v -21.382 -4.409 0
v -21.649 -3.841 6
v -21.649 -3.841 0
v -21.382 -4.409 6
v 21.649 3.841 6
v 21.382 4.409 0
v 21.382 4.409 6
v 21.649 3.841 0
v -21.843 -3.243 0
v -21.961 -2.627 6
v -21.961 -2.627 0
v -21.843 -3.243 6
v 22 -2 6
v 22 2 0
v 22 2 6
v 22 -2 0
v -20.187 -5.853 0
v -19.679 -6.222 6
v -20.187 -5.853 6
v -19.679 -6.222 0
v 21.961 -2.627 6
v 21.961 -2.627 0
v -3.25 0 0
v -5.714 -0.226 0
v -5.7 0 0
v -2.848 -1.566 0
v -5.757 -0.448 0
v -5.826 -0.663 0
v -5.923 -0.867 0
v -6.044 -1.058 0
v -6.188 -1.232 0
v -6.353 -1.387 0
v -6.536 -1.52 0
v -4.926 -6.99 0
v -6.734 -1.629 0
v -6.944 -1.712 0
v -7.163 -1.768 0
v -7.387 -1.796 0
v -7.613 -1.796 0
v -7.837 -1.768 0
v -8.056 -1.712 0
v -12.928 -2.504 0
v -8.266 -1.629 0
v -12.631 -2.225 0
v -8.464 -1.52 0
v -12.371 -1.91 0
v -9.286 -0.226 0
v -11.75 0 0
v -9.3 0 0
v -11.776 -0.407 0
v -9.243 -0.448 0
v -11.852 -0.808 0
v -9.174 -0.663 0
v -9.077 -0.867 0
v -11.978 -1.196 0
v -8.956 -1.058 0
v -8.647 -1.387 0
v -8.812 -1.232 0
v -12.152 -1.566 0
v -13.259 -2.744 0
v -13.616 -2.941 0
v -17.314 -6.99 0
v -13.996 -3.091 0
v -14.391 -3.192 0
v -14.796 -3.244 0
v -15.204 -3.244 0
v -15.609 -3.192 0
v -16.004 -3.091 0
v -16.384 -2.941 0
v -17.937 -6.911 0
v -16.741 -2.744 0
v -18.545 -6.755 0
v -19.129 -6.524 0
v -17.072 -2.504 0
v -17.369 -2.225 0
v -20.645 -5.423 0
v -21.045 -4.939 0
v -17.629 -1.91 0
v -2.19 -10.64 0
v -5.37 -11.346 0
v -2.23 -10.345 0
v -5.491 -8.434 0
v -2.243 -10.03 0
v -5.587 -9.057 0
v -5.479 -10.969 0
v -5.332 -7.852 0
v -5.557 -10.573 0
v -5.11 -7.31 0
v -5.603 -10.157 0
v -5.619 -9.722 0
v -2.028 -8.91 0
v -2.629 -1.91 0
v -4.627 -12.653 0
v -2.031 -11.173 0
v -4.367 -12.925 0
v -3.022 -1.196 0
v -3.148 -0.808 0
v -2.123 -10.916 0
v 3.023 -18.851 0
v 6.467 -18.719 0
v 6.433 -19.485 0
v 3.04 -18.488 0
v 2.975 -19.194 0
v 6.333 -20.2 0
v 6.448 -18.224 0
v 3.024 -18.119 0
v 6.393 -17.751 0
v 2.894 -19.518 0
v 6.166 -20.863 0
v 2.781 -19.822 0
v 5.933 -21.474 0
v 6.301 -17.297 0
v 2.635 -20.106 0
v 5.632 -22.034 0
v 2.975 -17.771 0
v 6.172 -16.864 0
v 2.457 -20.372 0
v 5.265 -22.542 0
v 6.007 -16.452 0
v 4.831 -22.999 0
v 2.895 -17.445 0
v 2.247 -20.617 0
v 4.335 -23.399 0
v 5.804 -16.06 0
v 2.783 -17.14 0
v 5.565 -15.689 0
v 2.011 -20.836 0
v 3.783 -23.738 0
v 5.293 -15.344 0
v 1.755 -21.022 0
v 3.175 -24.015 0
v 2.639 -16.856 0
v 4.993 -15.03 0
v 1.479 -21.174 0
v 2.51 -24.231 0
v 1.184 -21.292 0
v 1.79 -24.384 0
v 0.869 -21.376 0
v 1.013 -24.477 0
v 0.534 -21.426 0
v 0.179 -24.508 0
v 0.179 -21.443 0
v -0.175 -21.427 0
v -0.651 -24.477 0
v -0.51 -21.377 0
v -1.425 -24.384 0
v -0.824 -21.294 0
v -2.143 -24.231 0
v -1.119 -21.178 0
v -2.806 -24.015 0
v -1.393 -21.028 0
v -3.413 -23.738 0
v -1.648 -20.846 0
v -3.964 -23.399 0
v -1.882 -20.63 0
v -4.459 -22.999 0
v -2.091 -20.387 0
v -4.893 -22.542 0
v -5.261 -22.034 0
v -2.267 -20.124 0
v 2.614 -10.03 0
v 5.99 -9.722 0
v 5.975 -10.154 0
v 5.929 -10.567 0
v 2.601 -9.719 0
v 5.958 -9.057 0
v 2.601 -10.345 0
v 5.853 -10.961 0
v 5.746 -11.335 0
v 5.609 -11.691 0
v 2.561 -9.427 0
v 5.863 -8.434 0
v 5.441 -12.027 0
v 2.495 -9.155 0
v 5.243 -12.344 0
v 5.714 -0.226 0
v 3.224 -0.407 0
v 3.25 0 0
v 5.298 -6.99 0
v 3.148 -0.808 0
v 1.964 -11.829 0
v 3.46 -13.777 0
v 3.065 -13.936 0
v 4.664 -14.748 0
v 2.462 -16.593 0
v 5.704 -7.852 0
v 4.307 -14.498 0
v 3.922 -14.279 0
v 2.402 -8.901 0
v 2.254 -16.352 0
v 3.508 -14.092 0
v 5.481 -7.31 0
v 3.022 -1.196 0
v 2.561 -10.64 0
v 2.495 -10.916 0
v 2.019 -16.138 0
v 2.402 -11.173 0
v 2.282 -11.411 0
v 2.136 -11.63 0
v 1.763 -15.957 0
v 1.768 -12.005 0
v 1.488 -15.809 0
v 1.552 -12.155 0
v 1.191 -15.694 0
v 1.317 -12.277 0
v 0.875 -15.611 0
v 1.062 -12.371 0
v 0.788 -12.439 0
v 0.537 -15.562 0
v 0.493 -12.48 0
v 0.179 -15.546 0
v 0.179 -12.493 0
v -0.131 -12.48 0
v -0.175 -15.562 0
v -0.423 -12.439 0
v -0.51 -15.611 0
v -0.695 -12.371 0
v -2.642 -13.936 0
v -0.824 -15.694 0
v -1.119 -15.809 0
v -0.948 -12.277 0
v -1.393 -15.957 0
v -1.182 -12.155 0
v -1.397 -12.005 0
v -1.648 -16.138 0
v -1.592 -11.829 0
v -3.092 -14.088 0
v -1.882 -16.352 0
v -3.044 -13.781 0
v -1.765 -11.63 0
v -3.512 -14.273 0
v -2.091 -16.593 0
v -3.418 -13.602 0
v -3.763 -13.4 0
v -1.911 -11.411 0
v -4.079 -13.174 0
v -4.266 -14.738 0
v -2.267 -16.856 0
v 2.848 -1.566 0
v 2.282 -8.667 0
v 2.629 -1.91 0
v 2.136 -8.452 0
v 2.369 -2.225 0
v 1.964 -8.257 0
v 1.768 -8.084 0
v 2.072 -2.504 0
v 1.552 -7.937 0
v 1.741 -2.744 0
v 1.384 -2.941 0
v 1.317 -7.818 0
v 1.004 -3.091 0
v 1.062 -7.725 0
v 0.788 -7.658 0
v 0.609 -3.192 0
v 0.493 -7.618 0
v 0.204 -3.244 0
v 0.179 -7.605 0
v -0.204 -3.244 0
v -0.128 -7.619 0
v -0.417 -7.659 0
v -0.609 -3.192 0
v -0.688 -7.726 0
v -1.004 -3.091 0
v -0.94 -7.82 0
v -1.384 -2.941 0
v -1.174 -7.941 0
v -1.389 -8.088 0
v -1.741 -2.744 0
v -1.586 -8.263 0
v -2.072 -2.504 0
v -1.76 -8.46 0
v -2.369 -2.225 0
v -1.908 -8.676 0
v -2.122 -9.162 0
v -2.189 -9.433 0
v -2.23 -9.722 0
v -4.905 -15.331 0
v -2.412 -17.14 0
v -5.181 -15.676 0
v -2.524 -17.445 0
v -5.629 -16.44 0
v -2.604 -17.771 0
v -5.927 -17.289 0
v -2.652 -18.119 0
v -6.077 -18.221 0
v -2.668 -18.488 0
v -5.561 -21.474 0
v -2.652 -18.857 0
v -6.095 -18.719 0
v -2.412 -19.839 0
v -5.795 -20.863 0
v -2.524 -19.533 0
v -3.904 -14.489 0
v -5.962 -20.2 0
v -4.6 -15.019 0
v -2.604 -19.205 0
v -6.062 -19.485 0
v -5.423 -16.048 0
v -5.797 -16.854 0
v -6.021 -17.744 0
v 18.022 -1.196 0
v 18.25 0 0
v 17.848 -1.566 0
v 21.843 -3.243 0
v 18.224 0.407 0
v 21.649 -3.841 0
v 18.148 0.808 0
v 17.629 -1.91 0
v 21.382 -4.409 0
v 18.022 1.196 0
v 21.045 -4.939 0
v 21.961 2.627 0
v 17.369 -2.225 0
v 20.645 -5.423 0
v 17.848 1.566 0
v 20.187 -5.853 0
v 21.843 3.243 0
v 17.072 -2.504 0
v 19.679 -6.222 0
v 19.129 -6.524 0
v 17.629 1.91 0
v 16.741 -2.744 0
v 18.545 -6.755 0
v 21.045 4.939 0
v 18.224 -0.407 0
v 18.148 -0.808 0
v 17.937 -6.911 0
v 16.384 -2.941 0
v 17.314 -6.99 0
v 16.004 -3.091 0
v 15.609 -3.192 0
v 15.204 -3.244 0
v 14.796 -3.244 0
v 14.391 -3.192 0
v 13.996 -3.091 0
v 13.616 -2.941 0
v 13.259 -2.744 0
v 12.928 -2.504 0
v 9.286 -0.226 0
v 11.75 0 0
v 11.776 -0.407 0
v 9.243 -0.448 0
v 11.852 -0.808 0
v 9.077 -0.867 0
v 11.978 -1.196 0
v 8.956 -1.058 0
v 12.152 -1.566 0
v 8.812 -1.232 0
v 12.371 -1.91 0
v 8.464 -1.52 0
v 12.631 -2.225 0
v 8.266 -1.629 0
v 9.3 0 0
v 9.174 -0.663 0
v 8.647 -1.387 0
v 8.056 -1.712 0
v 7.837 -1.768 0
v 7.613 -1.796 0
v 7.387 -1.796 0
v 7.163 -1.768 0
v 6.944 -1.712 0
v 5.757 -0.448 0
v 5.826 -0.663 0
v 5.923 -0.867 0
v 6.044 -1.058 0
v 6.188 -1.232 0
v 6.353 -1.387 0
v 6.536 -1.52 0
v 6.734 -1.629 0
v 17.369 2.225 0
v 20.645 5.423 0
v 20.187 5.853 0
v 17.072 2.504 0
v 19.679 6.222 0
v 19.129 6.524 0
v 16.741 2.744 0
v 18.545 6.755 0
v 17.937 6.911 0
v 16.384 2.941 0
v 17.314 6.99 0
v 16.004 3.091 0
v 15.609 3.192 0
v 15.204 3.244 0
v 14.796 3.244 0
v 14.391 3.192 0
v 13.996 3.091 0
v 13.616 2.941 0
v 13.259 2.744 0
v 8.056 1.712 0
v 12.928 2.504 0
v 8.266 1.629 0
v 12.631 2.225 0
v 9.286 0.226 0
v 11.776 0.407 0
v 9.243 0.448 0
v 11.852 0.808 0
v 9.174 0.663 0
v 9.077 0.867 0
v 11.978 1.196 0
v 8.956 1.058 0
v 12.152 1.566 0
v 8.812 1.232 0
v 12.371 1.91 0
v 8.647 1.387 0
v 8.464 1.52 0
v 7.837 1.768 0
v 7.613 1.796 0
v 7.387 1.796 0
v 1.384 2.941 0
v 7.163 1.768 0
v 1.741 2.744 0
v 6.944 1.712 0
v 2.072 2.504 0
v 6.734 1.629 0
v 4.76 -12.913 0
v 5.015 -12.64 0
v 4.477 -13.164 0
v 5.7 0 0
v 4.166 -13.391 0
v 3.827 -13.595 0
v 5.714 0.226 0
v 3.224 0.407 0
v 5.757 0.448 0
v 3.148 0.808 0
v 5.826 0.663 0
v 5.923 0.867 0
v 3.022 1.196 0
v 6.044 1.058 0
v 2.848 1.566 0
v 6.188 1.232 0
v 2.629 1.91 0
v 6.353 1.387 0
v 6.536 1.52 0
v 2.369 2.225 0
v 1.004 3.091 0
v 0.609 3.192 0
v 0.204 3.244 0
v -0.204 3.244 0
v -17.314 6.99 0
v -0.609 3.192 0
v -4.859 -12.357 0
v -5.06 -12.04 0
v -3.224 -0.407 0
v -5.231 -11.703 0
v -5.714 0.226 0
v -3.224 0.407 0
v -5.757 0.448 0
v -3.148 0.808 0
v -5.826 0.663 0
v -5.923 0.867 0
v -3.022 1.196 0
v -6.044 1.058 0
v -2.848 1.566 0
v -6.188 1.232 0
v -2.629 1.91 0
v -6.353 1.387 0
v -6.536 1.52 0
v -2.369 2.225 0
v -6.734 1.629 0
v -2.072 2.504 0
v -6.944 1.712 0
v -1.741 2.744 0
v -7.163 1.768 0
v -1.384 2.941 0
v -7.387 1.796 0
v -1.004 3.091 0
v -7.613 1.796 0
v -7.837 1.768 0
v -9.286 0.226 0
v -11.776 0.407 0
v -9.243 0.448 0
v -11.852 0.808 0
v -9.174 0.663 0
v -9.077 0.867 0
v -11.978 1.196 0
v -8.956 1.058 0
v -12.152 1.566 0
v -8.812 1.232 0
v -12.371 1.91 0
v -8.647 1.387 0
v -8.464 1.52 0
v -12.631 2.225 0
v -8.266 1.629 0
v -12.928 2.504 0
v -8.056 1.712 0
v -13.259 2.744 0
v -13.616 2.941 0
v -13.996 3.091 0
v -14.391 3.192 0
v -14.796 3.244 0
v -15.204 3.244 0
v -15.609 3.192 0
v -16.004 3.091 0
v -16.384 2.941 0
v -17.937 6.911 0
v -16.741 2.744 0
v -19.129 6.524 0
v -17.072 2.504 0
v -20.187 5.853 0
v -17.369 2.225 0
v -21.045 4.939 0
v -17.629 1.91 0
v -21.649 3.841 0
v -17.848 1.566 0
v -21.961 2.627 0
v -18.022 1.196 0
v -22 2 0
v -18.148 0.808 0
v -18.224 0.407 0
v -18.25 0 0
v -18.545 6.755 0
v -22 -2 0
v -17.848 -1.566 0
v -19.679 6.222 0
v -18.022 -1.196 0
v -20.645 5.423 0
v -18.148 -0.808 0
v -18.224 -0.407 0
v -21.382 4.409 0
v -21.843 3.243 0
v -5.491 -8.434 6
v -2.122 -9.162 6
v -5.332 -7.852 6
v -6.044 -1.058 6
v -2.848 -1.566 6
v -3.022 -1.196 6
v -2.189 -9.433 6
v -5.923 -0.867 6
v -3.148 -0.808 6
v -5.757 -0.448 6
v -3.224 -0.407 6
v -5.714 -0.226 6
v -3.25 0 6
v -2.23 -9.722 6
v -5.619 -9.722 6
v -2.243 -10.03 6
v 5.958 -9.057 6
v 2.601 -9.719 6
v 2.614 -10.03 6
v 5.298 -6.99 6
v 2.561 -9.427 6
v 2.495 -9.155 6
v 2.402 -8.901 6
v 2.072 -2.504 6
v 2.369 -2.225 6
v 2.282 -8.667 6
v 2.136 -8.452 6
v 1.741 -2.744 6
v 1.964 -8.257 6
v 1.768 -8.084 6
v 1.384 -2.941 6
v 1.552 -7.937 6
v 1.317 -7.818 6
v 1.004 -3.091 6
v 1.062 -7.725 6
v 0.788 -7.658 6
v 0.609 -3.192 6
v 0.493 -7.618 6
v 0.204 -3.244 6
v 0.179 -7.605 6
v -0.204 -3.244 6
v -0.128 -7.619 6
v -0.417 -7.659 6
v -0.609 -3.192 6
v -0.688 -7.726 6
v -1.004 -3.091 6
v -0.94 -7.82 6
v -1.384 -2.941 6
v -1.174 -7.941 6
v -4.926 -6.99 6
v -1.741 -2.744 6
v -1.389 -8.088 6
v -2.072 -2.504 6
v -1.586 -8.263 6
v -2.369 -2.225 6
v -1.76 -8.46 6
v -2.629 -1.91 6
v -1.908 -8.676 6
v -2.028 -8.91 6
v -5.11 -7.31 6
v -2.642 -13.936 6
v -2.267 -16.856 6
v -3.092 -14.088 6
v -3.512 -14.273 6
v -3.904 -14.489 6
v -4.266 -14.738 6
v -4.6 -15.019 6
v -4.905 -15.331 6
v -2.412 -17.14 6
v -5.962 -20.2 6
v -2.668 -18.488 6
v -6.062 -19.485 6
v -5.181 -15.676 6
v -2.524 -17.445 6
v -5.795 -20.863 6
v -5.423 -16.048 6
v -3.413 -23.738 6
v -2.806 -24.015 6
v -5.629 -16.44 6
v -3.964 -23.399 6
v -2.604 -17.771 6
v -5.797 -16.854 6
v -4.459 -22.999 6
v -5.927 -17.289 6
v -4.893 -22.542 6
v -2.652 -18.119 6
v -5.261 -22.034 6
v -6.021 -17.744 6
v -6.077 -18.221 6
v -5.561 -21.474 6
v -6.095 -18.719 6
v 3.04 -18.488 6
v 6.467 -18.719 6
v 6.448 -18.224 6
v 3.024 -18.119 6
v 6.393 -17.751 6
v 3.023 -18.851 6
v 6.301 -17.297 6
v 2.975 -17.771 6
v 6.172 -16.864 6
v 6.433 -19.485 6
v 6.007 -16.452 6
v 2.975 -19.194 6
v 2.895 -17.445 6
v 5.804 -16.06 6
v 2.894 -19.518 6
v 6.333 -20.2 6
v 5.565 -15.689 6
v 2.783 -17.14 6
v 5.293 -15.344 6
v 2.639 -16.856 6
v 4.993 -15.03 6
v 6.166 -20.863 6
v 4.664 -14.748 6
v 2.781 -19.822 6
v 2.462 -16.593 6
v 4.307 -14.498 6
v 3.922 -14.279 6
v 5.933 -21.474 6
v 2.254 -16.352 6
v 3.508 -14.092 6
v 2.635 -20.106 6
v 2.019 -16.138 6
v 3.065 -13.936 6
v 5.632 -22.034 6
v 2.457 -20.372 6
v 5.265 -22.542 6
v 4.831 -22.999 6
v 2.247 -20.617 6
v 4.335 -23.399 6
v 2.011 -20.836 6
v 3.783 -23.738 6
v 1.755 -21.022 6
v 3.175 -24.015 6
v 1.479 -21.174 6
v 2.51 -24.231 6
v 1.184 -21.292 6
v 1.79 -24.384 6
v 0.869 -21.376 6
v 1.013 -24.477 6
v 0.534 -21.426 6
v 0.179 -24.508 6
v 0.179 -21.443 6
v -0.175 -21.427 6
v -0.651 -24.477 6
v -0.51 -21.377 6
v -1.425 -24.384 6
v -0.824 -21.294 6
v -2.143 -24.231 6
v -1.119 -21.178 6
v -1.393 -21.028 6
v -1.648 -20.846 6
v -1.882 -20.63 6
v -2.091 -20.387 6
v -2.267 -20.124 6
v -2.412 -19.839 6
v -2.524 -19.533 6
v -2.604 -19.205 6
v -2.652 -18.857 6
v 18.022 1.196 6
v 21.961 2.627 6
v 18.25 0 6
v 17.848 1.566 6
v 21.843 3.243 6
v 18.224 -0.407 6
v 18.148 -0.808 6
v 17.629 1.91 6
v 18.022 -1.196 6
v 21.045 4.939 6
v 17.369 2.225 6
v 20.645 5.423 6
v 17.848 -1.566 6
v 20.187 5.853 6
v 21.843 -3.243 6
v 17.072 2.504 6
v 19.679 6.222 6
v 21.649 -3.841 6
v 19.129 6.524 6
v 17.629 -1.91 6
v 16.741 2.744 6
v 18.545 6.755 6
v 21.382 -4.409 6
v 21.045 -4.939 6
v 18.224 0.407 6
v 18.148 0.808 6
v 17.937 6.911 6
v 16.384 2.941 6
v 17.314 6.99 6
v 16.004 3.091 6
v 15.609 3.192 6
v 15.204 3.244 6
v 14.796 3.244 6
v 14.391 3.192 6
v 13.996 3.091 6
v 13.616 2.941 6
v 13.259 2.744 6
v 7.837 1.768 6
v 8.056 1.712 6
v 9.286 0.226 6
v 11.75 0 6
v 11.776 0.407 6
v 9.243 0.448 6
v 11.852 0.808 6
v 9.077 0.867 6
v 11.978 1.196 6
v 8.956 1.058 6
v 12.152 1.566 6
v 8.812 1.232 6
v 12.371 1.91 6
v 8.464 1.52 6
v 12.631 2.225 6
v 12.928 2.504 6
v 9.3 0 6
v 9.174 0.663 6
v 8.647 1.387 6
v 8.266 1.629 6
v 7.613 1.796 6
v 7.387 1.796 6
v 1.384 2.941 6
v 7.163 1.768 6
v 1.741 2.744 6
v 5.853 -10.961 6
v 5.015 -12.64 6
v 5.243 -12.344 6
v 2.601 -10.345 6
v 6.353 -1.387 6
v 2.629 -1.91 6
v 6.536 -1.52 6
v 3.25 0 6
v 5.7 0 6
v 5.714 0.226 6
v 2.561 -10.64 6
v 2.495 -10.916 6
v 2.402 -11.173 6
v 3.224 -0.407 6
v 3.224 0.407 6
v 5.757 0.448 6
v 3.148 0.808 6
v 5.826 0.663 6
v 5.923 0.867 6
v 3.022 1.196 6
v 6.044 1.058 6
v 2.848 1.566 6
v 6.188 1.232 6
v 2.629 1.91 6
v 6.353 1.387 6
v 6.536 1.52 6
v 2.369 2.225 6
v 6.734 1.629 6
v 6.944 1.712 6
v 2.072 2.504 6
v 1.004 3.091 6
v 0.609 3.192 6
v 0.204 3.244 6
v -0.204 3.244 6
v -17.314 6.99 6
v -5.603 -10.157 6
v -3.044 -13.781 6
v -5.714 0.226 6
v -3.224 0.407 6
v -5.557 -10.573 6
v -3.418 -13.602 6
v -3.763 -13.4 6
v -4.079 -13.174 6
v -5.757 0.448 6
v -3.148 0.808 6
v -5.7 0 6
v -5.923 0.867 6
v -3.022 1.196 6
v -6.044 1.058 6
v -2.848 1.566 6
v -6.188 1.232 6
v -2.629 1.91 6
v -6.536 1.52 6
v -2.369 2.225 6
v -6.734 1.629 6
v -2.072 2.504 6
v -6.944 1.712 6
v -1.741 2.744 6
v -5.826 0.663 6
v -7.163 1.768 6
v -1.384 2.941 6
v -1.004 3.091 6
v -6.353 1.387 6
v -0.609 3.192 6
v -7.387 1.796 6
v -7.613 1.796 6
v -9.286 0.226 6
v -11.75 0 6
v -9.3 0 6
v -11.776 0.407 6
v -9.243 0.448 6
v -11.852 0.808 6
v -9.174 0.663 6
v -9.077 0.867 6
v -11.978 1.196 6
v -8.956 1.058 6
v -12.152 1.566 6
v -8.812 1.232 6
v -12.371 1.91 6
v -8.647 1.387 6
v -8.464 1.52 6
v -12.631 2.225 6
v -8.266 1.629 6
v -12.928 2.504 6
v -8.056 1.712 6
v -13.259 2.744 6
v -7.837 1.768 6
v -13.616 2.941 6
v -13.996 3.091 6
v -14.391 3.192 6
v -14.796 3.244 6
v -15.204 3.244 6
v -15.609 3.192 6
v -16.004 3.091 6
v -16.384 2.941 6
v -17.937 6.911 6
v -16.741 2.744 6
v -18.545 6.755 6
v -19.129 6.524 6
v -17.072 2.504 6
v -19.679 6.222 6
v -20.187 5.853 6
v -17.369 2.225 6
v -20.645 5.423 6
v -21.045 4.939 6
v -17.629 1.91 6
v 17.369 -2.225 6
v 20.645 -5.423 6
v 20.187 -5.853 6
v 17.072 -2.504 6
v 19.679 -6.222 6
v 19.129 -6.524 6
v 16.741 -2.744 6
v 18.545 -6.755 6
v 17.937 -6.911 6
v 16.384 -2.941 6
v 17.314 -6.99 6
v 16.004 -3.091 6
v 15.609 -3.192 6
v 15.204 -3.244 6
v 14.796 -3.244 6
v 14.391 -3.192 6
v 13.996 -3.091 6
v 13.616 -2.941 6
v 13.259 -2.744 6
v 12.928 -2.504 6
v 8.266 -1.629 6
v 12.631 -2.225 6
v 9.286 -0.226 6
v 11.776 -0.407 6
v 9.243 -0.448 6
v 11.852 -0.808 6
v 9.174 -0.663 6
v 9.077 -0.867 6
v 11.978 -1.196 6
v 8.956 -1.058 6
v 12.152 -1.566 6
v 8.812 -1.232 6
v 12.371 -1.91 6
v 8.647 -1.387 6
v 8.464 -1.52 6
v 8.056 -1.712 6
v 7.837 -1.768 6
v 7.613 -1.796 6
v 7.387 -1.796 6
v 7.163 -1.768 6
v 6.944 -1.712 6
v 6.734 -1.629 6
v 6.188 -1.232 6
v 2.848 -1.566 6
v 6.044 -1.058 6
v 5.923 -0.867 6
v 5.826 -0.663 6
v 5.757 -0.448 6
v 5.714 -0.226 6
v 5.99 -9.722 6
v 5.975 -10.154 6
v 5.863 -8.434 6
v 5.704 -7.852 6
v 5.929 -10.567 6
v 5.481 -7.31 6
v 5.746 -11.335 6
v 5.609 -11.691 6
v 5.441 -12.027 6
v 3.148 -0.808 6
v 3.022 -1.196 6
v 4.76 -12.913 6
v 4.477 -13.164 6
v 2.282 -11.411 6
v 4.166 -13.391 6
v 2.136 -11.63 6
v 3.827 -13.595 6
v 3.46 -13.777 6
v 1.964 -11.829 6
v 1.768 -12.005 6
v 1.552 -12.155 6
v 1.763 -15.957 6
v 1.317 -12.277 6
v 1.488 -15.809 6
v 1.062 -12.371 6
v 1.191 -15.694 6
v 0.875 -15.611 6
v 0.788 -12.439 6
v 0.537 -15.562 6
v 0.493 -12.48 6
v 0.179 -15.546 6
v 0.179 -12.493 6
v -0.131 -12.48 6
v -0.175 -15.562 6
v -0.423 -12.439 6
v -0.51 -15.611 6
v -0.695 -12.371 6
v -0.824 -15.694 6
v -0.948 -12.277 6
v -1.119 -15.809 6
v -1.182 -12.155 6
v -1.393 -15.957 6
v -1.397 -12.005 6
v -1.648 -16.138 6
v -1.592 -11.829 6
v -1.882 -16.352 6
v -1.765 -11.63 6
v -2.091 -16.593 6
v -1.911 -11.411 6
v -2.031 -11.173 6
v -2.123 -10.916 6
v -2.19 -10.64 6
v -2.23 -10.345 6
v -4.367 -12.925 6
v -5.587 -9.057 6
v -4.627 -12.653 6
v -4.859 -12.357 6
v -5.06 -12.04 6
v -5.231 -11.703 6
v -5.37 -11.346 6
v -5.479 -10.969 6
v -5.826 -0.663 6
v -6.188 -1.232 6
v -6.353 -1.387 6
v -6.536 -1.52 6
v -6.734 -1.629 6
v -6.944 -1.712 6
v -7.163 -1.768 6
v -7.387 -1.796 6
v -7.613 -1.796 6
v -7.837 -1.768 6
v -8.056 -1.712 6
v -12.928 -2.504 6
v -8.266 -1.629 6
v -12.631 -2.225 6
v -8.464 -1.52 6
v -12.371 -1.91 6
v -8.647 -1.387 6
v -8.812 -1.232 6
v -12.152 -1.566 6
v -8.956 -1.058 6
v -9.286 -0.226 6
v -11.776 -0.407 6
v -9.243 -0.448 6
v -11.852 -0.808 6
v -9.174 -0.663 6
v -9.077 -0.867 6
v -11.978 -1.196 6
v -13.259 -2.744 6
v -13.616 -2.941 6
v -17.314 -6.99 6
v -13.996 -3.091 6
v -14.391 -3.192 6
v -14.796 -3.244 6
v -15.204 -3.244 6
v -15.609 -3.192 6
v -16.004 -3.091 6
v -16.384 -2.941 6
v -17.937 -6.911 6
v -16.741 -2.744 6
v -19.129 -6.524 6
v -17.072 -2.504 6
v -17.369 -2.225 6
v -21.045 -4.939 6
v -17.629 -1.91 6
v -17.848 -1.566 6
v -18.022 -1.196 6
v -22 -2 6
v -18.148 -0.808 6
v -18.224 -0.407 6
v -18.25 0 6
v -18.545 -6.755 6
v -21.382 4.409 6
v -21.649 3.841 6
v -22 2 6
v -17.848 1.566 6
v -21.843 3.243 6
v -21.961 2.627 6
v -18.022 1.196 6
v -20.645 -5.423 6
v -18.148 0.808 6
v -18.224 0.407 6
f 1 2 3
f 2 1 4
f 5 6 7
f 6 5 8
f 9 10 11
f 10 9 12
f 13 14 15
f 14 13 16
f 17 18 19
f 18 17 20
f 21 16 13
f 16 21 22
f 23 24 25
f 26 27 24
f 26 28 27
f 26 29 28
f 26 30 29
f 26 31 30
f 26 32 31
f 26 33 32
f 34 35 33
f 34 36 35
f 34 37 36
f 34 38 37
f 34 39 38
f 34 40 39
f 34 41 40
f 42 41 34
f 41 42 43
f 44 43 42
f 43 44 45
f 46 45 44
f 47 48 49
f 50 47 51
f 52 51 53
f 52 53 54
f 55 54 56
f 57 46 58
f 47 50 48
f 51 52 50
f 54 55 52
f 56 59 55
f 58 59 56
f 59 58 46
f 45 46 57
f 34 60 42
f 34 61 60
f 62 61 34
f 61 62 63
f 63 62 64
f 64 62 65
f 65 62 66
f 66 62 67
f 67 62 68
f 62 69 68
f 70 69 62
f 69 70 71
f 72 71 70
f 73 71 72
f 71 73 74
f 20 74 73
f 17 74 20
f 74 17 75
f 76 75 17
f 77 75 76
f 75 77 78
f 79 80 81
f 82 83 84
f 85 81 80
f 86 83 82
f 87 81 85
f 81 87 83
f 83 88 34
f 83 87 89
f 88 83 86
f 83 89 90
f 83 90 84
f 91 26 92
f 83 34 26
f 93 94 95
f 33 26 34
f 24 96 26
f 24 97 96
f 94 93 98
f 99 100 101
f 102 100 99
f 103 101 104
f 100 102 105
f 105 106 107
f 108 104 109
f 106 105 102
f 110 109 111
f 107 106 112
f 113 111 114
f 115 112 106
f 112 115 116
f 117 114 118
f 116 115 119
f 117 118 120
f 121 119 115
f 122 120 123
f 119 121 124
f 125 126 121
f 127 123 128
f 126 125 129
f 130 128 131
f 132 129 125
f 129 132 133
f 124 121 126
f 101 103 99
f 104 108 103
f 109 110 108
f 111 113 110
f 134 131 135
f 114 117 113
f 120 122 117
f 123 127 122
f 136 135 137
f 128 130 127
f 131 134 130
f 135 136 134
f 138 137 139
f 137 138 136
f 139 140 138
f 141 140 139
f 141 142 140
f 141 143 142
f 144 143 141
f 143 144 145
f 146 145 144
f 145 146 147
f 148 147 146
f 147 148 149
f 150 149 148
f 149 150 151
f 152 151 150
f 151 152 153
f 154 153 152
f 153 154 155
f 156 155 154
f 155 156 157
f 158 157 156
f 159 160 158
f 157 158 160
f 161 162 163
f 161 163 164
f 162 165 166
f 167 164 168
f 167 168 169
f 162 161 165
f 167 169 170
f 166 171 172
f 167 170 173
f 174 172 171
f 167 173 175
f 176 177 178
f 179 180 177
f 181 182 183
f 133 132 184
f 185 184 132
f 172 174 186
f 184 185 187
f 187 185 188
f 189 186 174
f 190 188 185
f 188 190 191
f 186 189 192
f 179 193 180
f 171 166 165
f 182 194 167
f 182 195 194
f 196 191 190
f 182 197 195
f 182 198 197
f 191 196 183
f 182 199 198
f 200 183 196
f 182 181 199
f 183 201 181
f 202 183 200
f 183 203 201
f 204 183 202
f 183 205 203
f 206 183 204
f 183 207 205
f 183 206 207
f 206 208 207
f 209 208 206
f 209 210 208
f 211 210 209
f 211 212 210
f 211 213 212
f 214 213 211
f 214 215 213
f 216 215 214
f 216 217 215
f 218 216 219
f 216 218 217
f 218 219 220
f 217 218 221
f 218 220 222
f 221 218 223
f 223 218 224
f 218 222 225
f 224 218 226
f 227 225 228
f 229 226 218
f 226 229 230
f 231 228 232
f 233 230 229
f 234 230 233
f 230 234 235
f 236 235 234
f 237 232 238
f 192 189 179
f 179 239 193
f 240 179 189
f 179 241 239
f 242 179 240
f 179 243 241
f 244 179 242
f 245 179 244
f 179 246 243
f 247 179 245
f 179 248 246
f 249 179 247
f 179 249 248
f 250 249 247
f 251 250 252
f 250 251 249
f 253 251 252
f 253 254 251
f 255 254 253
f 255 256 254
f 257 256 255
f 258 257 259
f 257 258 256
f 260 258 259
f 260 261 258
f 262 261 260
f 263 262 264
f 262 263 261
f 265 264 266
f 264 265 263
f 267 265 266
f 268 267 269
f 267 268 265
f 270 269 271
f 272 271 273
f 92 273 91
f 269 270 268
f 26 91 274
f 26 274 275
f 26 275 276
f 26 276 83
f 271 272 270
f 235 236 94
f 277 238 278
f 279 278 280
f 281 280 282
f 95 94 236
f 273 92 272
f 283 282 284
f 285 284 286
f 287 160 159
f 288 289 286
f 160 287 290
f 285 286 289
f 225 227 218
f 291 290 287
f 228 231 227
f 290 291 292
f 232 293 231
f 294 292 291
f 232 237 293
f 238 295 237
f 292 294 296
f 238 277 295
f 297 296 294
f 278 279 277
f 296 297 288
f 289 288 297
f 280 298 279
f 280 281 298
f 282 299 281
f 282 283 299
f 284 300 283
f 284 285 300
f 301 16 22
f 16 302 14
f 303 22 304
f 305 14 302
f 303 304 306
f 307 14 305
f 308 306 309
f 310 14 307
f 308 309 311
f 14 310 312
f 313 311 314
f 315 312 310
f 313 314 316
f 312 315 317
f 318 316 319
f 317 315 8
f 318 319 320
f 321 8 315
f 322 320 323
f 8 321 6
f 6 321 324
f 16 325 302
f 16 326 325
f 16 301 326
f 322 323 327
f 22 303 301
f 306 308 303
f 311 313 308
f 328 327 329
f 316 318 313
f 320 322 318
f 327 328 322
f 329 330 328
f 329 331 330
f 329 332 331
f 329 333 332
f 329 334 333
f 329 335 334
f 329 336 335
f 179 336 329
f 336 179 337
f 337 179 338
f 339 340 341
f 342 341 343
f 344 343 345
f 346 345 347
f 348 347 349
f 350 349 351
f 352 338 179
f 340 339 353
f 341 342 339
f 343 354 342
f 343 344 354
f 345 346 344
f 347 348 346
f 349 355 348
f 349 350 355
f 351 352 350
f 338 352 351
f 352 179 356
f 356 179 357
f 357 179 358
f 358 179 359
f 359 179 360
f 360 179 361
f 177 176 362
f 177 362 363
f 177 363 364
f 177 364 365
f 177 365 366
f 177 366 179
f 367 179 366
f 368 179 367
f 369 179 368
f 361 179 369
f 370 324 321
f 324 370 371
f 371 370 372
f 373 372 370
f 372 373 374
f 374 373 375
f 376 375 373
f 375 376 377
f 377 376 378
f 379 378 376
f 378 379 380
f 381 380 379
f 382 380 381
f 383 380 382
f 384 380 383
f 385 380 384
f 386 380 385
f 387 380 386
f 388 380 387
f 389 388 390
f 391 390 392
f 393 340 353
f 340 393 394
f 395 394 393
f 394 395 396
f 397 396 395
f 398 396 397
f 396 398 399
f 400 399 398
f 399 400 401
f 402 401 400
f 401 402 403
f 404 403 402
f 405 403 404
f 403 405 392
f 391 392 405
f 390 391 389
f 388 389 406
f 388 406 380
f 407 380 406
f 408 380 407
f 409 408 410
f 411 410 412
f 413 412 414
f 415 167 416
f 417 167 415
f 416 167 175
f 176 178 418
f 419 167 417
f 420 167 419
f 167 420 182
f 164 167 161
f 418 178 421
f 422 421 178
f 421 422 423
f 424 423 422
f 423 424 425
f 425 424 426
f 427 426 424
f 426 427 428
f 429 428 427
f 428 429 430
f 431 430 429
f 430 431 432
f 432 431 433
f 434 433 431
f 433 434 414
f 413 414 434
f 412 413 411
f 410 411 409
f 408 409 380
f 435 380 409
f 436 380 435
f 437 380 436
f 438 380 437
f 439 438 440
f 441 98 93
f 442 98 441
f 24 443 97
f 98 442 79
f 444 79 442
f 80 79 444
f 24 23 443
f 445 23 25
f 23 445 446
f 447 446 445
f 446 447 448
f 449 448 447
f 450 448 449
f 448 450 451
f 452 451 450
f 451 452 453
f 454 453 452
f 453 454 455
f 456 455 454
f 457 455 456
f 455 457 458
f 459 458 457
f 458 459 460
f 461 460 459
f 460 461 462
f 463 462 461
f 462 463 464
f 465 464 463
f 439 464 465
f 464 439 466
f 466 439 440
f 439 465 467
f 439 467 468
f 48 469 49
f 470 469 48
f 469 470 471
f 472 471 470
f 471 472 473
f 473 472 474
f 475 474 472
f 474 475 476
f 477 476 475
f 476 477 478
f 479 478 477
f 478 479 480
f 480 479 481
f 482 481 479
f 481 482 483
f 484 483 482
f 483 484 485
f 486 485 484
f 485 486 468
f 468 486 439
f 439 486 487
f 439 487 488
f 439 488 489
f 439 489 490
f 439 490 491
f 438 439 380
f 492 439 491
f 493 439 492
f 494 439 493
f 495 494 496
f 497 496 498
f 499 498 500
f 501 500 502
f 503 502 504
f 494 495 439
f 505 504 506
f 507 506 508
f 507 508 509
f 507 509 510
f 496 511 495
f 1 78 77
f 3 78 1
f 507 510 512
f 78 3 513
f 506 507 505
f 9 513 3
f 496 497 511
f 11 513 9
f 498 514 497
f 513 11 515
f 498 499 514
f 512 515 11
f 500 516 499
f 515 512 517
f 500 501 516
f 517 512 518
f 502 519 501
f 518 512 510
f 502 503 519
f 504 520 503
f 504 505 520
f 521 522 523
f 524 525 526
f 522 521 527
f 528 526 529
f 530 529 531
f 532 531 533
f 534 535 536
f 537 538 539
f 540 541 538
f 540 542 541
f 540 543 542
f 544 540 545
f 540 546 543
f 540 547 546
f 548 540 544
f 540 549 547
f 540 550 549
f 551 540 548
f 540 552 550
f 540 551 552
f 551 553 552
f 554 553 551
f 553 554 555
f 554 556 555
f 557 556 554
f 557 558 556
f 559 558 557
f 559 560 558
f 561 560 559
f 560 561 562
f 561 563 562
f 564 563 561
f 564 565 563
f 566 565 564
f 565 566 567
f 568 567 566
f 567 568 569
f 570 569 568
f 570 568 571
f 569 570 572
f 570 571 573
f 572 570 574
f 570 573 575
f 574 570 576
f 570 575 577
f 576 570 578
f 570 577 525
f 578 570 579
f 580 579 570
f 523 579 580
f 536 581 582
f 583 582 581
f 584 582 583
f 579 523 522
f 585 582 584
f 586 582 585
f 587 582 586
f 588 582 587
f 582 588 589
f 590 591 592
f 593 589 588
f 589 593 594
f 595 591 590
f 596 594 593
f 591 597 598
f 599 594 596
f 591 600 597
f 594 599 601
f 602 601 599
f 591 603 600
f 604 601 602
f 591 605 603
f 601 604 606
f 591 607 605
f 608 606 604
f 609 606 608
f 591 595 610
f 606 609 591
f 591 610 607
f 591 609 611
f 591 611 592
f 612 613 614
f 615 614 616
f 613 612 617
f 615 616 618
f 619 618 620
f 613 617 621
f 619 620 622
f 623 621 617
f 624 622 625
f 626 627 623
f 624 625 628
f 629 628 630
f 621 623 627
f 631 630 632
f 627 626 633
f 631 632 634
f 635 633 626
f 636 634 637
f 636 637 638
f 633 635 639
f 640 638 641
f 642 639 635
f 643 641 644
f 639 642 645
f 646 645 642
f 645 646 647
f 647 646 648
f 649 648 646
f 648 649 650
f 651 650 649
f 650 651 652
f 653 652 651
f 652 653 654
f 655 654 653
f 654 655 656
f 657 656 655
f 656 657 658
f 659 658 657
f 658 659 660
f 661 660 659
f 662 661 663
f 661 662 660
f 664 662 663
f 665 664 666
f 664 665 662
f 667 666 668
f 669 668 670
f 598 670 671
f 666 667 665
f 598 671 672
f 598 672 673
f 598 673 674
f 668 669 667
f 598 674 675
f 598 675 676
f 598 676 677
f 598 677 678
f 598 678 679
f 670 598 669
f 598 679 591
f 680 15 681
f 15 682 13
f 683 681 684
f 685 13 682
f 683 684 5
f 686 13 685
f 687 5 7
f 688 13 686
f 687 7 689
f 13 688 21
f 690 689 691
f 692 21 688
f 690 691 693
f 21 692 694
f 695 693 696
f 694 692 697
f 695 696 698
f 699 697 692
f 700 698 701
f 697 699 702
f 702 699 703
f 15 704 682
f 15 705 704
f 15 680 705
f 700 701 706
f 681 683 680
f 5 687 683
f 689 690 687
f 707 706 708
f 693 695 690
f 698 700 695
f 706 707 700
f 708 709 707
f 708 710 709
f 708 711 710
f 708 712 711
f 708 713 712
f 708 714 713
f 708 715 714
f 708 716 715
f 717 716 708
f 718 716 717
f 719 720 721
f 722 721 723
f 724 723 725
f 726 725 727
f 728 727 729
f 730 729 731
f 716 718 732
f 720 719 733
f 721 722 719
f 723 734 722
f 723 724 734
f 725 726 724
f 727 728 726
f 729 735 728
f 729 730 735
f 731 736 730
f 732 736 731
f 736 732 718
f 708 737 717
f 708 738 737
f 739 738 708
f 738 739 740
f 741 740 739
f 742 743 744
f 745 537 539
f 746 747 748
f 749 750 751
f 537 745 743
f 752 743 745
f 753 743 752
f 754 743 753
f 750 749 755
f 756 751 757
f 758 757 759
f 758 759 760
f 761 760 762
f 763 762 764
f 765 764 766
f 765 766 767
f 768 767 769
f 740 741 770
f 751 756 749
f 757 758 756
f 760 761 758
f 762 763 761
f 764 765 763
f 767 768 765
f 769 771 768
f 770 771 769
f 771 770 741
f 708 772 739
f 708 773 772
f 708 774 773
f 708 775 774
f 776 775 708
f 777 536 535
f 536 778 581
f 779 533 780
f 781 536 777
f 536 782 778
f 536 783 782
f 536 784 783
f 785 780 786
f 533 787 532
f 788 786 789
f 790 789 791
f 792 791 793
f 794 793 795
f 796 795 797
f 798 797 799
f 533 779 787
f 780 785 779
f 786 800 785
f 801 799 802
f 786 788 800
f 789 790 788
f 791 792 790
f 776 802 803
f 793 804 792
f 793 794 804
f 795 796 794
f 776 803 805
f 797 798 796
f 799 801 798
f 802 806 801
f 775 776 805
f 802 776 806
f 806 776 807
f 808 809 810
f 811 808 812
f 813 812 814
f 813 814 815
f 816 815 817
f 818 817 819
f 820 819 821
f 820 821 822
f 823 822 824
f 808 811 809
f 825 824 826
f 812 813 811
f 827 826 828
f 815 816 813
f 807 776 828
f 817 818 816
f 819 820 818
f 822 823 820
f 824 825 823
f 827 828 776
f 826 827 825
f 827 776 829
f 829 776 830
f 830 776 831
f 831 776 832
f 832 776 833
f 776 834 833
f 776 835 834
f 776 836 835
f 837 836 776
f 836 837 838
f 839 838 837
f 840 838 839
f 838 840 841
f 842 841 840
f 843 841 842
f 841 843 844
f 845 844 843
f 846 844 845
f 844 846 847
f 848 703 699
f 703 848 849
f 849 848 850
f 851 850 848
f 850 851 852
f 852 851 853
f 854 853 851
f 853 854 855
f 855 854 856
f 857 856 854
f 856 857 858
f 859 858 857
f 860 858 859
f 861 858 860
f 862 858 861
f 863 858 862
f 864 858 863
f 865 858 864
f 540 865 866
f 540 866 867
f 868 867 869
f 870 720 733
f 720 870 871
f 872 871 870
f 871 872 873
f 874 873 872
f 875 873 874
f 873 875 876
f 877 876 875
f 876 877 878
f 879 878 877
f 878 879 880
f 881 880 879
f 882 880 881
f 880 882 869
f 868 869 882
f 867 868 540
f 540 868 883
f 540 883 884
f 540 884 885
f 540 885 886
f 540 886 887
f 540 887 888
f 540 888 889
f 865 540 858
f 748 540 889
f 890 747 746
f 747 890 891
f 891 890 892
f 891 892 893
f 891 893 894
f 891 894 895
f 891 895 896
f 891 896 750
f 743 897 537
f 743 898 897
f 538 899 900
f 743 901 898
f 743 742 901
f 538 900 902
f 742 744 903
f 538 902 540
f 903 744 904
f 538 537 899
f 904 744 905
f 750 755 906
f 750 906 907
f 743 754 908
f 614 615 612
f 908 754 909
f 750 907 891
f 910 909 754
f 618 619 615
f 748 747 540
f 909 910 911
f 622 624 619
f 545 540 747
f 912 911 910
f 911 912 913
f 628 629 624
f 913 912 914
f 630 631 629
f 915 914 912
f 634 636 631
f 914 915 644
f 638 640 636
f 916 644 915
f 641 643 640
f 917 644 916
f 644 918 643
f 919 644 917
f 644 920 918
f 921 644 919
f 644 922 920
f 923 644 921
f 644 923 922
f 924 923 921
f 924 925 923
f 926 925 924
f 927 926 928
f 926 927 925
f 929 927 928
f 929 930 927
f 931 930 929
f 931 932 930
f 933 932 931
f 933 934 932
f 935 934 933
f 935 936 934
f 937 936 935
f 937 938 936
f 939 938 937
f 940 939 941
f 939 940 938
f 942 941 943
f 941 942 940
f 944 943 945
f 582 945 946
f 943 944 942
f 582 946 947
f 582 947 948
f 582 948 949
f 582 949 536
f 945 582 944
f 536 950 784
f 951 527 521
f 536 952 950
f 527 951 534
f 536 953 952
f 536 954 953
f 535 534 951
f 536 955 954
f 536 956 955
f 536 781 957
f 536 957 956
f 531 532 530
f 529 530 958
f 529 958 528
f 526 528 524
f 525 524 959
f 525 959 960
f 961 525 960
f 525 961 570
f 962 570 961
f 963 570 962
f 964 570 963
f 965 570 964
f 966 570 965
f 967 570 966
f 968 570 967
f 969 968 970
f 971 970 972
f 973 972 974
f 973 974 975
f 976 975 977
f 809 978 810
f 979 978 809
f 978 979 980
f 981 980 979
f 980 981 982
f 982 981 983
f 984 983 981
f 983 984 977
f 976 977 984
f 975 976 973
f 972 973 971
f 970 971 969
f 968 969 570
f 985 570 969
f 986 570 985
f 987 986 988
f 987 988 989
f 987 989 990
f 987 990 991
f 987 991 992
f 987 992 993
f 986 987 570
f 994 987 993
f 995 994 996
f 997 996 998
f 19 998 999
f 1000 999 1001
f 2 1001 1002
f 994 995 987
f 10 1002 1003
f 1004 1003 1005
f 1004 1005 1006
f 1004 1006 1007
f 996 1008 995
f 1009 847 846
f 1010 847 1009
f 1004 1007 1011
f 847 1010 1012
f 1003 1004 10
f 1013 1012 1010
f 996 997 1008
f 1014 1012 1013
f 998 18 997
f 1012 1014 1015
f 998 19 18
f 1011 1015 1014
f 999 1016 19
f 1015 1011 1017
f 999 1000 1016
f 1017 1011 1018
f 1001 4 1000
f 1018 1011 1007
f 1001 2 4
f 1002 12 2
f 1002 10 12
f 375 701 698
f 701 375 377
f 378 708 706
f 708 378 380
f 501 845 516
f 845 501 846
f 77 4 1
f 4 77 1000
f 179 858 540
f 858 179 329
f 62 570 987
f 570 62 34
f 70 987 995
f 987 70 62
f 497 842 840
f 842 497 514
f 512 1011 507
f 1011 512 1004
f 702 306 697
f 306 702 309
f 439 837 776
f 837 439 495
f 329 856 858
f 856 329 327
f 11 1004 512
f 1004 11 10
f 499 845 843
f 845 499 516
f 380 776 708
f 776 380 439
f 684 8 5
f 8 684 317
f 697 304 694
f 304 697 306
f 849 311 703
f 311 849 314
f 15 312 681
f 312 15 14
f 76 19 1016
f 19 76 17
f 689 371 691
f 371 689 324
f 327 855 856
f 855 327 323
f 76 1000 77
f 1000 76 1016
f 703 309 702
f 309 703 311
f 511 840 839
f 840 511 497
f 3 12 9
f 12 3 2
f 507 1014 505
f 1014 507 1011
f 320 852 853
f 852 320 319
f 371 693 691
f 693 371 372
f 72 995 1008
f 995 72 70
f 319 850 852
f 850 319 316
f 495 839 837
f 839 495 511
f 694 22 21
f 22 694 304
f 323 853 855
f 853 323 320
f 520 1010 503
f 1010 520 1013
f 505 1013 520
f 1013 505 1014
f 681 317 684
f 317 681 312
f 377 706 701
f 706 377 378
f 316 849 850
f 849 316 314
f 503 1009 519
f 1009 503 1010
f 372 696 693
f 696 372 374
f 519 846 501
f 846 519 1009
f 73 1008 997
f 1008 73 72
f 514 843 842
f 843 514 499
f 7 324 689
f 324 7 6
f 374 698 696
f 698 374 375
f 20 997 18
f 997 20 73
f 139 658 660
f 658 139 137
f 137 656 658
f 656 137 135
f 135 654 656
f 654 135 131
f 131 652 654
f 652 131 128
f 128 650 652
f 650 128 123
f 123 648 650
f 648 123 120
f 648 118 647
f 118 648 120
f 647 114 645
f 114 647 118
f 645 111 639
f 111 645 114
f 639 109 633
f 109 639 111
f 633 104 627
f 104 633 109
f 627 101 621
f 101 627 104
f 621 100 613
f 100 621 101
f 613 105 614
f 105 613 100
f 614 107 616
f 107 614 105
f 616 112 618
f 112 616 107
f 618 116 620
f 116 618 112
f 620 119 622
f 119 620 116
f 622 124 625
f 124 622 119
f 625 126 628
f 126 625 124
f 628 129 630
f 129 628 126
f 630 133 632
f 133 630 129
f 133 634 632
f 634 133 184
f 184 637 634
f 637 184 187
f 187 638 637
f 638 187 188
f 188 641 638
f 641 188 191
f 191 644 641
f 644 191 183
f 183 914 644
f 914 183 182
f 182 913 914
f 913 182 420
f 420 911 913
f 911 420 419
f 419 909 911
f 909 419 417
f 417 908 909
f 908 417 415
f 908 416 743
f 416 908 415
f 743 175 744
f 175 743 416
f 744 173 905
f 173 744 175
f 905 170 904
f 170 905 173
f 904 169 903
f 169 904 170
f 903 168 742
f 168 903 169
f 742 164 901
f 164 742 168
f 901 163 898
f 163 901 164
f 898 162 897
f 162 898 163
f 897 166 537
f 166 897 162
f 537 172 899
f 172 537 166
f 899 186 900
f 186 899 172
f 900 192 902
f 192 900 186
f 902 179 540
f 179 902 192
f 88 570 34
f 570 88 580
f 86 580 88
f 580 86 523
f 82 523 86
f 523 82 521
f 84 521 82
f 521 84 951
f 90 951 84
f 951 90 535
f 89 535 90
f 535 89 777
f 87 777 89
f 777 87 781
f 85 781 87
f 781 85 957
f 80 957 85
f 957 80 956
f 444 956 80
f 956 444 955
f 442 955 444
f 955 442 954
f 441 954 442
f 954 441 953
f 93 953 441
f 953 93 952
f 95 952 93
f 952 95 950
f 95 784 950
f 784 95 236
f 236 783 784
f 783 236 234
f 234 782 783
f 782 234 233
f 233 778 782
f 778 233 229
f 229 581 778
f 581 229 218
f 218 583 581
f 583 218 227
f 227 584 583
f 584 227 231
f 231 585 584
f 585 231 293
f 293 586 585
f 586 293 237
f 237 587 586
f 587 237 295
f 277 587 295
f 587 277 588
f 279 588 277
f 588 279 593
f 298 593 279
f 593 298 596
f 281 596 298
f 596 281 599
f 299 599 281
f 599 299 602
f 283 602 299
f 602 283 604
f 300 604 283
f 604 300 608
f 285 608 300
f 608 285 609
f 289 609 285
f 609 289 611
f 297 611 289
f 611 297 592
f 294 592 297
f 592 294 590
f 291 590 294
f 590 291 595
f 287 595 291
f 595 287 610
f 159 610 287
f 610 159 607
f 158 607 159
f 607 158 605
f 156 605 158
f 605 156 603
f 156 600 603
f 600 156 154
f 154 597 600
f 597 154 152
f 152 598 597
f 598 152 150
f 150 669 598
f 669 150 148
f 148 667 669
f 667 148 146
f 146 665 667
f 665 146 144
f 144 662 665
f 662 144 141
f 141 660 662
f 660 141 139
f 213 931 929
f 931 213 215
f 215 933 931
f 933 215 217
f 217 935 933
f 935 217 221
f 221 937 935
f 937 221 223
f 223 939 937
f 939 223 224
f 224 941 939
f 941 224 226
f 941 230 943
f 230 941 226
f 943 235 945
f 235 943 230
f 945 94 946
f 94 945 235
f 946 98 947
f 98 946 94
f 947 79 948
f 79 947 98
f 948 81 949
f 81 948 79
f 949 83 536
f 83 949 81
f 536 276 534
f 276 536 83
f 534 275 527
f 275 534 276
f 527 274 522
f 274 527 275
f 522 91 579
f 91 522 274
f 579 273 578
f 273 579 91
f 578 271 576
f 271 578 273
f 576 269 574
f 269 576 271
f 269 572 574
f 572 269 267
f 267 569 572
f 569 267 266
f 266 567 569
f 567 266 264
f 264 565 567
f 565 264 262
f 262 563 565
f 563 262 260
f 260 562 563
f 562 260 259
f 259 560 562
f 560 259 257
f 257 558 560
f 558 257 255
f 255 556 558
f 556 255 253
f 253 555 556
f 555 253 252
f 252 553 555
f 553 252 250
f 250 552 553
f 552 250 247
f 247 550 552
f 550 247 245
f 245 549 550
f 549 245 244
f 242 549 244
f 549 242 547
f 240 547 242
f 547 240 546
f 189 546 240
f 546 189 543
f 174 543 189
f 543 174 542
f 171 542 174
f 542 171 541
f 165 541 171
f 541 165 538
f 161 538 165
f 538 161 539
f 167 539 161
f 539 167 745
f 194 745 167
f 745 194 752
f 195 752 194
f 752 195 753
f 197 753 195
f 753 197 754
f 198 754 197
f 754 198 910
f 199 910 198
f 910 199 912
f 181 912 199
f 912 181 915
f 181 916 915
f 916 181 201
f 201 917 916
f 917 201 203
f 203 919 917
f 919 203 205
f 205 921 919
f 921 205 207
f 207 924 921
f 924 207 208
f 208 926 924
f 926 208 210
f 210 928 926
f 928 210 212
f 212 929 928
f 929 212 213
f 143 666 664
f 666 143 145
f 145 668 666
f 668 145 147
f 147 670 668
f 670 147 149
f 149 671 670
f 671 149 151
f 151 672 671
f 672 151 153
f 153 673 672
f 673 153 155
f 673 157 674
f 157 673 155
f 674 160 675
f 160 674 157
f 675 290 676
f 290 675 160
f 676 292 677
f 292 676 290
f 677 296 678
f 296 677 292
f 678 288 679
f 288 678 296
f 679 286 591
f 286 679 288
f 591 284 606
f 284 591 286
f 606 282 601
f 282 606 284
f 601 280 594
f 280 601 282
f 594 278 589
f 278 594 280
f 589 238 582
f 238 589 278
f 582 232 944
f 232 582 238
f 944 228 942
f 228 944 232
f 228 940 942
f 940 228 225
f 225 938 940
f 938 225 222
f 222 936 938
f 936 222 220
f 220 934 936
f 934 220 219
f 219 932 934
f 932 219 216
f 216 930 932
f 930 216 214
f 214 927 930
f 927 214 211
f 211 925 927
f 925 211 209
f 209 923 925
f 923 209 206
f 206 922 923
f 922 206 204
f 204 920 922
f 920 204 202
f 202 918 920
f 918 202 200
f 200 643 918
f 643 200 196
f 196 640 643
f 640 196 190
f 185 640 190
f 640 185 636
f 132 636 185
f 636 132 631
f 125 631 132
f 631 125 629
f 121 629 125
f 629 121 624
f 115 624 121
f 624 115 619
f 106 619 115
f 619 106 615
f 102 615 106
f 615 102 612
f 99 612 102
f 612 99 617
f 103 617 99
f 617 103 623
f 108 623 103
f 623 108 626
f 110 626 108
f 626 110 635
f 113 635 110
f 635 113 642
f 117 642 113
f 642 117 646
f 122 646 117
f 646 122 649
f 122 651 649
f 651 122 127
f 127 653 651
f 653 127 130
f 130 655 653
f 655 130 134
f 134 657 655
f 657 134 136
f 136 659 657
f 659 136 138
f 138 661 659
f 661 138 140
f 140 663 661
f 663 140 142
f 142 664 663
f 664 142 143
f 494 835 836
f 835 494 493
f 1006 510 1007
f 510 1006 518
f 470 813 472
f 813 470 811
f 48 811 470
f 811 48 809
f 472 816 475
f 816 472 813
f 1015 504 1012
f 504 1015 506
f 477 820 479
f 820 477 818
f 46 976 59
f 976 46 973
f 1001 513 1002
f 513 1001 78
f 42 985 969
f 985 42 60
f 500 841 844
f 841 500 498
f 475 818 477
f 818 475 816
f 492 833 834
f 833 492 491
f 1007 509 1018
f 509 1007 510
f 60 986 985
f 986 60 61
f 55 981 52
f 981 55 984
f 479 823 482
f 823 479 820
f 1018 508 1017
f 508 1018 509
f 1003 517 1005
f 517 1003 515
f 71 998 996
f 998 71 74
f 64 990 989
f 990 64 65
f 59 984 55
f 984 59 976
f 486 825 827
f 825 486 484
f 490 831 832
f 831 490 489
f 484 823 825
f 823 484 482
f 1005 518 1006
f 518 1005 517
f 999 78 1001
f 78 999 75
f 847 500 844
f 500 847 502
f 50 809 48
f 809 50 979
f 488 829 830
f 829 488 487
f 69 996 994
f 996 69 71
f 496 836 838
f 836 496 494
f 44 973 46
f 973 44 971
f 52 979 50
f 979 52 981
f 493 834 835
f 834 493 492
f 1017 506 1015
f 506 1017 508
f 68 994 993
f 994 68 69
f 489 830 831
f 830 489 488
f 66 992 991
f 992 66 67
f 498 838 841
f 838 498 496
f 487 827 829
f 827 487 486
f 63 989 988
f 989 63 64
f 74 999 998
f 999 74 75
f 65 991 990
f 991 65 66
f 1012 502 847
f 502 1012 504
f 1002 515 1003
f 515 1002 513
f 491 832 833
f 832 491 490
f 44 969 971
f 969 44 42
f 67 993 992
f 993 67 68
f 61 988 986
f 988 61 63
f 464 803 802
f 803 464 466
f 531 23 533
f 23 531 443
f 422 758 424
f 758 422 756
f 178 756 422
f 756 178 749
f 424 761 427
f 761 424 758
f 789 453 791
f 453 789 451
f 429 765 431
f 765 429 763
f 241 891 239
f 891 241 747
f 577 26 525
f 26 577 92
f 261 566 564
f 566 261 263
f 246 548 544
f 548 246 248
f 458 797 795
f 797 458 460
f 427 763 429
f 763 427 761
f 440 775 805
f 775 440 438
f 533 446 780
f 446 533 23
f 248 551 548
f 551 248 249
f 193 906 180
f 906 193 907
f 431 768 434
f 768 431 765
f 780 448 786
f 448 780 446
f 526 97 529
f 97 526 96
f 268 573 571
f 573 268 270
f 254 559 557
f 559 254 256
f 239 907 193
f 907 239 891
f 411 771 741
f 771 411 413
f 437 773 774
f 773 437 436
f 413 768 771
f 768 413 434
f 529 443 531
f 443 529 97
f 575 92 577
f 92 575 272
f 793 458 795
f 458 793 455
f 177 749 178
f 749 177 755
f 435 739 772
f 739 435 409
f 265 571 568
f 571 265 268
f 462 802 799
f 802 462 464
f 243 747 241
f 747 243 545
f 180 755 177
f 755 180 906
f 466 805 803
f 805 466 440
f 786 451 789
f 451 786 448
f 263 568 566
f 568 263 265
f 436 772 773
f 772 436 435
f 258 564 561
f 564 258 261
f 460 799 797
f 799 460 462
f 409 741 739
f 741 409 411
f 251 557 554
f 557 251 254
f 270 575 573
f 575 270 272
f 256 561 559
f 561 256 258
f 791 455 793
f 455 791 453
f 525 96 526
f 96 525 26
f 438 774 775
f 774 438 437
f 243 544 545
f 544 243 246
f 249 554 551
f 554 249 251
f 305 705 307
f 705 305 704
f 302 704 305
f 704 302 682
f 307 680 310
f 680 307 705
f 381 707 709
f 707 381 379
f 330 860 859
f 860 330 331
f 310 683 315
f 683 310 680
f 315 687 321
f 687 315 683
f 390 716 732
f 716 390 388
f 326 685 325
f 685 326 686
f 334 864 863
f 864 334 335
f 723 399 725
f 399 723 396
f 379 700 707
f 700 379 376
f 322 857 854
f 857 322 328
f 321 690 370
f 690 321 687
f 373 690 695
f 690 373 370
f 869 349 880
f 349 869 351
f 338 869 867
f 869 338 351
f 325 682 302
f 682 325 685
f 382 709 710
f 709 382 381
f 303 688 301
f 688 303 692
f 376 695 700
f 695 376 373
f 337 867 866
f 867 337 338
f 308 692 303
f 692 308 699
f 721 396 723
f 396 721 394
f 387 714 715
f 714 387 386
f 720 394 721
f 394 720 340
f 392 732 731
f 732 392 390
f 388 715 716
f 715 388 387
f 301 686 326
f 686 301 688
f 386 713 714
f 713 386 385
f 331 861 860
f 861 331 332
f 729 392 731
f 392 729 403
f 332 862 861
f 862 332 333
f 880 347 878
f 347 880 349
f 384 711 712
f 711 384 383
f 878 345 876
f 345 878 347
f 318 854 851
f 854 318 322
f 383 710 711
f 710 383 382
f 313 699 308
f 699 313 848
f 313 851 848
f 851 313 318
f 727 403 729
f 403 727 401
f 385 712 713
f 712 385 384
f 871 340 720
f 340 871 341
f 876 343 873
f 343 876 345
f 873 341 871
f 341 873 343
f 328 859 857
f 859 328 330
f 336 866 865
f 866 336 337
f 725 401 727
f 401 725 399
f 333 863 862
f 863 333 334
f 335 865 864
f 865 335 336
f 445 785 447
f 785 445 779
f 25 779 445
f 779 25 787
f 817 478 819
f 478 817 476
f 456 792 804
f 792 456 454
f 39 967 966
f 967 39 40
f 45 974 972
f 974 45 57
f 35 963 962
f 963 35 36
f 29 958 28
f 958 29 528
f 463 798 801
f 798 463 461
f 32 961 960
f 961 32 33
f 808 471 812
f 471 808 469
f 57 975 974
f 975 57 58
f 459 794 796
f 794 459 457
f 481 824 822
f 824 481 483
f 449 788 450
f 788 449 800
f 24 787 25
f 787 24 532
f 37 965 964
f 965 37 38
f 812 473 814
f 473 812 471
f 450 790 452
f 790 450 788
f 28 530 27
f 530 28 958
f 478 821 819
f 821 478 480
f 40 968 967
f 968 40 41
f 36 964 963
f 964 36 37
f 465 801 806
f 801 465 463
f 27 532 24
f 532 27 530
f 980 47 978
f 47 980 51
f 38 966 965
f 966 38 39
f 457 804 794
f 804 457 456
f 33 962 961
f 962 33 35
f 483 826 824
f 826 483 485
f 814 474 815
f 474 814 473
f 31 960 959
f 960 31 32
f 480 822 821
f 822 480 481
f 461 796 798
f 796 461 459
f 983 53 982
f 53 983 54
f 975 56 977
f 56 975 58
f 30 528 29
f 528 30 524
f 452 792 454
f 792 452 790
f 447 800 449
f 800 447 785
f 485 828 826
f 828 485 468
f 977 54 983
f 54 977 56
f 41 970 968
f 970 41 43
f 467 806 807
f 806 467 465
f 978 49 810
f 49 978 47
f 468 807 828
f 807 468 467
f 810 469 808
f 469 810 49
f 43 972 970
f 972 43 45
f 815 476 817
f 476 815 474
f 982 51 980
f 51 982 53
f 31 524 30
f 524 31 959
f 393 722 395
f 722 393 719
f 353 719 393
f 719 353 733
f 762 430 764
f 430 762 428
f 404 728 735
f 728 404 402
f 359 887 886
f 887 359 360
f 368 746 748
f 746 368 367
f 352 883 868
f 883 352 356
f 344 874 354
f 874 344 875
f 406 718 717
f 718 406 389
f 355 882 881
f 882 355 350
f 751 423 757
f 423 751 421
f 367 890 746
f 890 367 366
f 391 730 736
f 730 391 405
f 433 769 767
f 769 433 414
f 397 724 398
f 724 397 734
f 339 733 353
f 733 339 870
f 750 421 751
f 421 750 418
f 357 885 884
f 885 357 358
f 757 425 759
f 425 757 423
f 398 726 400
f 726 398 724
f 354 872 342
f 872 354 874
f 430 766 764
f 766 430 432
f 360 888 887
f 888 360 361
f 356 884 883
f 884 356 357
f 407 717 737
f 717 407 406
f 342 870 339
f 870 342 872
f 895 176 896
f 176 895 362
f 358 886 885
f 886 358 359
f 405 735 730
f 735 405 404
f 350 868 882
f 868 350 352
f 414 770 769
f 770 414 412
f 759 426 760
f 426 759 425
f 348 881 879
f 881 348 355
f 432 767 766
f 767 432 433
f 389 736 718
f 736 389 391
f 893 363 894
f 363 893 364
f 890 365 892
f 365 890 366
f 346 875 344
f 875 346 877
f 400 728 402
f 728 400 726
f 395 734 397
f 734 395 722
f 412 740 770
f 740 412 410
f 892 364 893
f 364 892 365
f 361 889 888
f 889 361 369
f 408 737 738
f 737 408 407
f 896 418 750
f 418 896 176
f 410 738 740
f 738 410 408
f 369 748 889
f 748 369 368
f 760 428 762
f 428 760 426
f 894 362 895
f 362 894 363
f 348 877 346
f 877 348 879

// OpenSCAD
$fn = 50;


difference() {
	union() {
		hull() {
			translate(v = [-17.0000000000, 2.0000000000, 0]) {
				cylinder(h = 6, r = 5);
			}
			translate(v = [17.0000000000, 2.0000000000, 0]) {
				cylinder(h = 6, r = 5);
			}
			translate(v = [-17.0000000000, -2.0000000000, 0]) {
				cylinder(h = 6, r = 5);
			}
			translate(v = [17.0000000000, -2.0000000000, 0]) {
				cylinder(h = 6, r = 5);
			}
		}
		translate(v = [0, -5, 0]) {
			linear_extrude(height = 6) {
				text(font = "DejaVu Sans Mono:style=Bold", halign = "center", size = 19.0000000000, text = "8", valign = "top");
			}
		}
	}
	union() {
		translate(v = [-15.0000000000, 0.0000000000, 0]) {
			translate(v = [0, 0, -100]) {
				cylinder(h = 200, r = 3.2500000000);
			}
		}
		translate(v = [0, 0, -100]) {
			cylinder(h = 200, r = 3.2500000000);
		}
		translate(v = [15.0000000000, 0.0000000000, 0]) {
			translate(v = [0, 0, -100]) {
				cylinder(h = 200, r = 3.2500000000);
			}
		}
		translate(v = [-15.0000000000, 0.0000000000, 0]) {
			translate(v = [0, 0, -100]) {
				cylinder(h = 200, r = 1.8000000000);
			}
		}
		translate(v = [-7.5000000000, 0.0000000000, 0]) {
			translate(v = [0, 0, -100]) {
				cylinder(h = 200, r = 1.8000000000);
			}
		}
		translate(v = [0, 0, -100]) {
			cylinder(h = 200, r = 1.8000000000);
		}
		translate(v = [7.5000000000, 0.0000000000, 0]) {
			translate(v = [0, 0, -100]) {
				cylinder(h = 200, r = 1.8000000000);
			}
		}
		translate(v = [15.0000000000, 0.0000000000, 0]) {
			translate(v = [0, 0, -100]) {
				cylinder(h = 200, r = 1.8000000000);
			}
		}
	}
}
